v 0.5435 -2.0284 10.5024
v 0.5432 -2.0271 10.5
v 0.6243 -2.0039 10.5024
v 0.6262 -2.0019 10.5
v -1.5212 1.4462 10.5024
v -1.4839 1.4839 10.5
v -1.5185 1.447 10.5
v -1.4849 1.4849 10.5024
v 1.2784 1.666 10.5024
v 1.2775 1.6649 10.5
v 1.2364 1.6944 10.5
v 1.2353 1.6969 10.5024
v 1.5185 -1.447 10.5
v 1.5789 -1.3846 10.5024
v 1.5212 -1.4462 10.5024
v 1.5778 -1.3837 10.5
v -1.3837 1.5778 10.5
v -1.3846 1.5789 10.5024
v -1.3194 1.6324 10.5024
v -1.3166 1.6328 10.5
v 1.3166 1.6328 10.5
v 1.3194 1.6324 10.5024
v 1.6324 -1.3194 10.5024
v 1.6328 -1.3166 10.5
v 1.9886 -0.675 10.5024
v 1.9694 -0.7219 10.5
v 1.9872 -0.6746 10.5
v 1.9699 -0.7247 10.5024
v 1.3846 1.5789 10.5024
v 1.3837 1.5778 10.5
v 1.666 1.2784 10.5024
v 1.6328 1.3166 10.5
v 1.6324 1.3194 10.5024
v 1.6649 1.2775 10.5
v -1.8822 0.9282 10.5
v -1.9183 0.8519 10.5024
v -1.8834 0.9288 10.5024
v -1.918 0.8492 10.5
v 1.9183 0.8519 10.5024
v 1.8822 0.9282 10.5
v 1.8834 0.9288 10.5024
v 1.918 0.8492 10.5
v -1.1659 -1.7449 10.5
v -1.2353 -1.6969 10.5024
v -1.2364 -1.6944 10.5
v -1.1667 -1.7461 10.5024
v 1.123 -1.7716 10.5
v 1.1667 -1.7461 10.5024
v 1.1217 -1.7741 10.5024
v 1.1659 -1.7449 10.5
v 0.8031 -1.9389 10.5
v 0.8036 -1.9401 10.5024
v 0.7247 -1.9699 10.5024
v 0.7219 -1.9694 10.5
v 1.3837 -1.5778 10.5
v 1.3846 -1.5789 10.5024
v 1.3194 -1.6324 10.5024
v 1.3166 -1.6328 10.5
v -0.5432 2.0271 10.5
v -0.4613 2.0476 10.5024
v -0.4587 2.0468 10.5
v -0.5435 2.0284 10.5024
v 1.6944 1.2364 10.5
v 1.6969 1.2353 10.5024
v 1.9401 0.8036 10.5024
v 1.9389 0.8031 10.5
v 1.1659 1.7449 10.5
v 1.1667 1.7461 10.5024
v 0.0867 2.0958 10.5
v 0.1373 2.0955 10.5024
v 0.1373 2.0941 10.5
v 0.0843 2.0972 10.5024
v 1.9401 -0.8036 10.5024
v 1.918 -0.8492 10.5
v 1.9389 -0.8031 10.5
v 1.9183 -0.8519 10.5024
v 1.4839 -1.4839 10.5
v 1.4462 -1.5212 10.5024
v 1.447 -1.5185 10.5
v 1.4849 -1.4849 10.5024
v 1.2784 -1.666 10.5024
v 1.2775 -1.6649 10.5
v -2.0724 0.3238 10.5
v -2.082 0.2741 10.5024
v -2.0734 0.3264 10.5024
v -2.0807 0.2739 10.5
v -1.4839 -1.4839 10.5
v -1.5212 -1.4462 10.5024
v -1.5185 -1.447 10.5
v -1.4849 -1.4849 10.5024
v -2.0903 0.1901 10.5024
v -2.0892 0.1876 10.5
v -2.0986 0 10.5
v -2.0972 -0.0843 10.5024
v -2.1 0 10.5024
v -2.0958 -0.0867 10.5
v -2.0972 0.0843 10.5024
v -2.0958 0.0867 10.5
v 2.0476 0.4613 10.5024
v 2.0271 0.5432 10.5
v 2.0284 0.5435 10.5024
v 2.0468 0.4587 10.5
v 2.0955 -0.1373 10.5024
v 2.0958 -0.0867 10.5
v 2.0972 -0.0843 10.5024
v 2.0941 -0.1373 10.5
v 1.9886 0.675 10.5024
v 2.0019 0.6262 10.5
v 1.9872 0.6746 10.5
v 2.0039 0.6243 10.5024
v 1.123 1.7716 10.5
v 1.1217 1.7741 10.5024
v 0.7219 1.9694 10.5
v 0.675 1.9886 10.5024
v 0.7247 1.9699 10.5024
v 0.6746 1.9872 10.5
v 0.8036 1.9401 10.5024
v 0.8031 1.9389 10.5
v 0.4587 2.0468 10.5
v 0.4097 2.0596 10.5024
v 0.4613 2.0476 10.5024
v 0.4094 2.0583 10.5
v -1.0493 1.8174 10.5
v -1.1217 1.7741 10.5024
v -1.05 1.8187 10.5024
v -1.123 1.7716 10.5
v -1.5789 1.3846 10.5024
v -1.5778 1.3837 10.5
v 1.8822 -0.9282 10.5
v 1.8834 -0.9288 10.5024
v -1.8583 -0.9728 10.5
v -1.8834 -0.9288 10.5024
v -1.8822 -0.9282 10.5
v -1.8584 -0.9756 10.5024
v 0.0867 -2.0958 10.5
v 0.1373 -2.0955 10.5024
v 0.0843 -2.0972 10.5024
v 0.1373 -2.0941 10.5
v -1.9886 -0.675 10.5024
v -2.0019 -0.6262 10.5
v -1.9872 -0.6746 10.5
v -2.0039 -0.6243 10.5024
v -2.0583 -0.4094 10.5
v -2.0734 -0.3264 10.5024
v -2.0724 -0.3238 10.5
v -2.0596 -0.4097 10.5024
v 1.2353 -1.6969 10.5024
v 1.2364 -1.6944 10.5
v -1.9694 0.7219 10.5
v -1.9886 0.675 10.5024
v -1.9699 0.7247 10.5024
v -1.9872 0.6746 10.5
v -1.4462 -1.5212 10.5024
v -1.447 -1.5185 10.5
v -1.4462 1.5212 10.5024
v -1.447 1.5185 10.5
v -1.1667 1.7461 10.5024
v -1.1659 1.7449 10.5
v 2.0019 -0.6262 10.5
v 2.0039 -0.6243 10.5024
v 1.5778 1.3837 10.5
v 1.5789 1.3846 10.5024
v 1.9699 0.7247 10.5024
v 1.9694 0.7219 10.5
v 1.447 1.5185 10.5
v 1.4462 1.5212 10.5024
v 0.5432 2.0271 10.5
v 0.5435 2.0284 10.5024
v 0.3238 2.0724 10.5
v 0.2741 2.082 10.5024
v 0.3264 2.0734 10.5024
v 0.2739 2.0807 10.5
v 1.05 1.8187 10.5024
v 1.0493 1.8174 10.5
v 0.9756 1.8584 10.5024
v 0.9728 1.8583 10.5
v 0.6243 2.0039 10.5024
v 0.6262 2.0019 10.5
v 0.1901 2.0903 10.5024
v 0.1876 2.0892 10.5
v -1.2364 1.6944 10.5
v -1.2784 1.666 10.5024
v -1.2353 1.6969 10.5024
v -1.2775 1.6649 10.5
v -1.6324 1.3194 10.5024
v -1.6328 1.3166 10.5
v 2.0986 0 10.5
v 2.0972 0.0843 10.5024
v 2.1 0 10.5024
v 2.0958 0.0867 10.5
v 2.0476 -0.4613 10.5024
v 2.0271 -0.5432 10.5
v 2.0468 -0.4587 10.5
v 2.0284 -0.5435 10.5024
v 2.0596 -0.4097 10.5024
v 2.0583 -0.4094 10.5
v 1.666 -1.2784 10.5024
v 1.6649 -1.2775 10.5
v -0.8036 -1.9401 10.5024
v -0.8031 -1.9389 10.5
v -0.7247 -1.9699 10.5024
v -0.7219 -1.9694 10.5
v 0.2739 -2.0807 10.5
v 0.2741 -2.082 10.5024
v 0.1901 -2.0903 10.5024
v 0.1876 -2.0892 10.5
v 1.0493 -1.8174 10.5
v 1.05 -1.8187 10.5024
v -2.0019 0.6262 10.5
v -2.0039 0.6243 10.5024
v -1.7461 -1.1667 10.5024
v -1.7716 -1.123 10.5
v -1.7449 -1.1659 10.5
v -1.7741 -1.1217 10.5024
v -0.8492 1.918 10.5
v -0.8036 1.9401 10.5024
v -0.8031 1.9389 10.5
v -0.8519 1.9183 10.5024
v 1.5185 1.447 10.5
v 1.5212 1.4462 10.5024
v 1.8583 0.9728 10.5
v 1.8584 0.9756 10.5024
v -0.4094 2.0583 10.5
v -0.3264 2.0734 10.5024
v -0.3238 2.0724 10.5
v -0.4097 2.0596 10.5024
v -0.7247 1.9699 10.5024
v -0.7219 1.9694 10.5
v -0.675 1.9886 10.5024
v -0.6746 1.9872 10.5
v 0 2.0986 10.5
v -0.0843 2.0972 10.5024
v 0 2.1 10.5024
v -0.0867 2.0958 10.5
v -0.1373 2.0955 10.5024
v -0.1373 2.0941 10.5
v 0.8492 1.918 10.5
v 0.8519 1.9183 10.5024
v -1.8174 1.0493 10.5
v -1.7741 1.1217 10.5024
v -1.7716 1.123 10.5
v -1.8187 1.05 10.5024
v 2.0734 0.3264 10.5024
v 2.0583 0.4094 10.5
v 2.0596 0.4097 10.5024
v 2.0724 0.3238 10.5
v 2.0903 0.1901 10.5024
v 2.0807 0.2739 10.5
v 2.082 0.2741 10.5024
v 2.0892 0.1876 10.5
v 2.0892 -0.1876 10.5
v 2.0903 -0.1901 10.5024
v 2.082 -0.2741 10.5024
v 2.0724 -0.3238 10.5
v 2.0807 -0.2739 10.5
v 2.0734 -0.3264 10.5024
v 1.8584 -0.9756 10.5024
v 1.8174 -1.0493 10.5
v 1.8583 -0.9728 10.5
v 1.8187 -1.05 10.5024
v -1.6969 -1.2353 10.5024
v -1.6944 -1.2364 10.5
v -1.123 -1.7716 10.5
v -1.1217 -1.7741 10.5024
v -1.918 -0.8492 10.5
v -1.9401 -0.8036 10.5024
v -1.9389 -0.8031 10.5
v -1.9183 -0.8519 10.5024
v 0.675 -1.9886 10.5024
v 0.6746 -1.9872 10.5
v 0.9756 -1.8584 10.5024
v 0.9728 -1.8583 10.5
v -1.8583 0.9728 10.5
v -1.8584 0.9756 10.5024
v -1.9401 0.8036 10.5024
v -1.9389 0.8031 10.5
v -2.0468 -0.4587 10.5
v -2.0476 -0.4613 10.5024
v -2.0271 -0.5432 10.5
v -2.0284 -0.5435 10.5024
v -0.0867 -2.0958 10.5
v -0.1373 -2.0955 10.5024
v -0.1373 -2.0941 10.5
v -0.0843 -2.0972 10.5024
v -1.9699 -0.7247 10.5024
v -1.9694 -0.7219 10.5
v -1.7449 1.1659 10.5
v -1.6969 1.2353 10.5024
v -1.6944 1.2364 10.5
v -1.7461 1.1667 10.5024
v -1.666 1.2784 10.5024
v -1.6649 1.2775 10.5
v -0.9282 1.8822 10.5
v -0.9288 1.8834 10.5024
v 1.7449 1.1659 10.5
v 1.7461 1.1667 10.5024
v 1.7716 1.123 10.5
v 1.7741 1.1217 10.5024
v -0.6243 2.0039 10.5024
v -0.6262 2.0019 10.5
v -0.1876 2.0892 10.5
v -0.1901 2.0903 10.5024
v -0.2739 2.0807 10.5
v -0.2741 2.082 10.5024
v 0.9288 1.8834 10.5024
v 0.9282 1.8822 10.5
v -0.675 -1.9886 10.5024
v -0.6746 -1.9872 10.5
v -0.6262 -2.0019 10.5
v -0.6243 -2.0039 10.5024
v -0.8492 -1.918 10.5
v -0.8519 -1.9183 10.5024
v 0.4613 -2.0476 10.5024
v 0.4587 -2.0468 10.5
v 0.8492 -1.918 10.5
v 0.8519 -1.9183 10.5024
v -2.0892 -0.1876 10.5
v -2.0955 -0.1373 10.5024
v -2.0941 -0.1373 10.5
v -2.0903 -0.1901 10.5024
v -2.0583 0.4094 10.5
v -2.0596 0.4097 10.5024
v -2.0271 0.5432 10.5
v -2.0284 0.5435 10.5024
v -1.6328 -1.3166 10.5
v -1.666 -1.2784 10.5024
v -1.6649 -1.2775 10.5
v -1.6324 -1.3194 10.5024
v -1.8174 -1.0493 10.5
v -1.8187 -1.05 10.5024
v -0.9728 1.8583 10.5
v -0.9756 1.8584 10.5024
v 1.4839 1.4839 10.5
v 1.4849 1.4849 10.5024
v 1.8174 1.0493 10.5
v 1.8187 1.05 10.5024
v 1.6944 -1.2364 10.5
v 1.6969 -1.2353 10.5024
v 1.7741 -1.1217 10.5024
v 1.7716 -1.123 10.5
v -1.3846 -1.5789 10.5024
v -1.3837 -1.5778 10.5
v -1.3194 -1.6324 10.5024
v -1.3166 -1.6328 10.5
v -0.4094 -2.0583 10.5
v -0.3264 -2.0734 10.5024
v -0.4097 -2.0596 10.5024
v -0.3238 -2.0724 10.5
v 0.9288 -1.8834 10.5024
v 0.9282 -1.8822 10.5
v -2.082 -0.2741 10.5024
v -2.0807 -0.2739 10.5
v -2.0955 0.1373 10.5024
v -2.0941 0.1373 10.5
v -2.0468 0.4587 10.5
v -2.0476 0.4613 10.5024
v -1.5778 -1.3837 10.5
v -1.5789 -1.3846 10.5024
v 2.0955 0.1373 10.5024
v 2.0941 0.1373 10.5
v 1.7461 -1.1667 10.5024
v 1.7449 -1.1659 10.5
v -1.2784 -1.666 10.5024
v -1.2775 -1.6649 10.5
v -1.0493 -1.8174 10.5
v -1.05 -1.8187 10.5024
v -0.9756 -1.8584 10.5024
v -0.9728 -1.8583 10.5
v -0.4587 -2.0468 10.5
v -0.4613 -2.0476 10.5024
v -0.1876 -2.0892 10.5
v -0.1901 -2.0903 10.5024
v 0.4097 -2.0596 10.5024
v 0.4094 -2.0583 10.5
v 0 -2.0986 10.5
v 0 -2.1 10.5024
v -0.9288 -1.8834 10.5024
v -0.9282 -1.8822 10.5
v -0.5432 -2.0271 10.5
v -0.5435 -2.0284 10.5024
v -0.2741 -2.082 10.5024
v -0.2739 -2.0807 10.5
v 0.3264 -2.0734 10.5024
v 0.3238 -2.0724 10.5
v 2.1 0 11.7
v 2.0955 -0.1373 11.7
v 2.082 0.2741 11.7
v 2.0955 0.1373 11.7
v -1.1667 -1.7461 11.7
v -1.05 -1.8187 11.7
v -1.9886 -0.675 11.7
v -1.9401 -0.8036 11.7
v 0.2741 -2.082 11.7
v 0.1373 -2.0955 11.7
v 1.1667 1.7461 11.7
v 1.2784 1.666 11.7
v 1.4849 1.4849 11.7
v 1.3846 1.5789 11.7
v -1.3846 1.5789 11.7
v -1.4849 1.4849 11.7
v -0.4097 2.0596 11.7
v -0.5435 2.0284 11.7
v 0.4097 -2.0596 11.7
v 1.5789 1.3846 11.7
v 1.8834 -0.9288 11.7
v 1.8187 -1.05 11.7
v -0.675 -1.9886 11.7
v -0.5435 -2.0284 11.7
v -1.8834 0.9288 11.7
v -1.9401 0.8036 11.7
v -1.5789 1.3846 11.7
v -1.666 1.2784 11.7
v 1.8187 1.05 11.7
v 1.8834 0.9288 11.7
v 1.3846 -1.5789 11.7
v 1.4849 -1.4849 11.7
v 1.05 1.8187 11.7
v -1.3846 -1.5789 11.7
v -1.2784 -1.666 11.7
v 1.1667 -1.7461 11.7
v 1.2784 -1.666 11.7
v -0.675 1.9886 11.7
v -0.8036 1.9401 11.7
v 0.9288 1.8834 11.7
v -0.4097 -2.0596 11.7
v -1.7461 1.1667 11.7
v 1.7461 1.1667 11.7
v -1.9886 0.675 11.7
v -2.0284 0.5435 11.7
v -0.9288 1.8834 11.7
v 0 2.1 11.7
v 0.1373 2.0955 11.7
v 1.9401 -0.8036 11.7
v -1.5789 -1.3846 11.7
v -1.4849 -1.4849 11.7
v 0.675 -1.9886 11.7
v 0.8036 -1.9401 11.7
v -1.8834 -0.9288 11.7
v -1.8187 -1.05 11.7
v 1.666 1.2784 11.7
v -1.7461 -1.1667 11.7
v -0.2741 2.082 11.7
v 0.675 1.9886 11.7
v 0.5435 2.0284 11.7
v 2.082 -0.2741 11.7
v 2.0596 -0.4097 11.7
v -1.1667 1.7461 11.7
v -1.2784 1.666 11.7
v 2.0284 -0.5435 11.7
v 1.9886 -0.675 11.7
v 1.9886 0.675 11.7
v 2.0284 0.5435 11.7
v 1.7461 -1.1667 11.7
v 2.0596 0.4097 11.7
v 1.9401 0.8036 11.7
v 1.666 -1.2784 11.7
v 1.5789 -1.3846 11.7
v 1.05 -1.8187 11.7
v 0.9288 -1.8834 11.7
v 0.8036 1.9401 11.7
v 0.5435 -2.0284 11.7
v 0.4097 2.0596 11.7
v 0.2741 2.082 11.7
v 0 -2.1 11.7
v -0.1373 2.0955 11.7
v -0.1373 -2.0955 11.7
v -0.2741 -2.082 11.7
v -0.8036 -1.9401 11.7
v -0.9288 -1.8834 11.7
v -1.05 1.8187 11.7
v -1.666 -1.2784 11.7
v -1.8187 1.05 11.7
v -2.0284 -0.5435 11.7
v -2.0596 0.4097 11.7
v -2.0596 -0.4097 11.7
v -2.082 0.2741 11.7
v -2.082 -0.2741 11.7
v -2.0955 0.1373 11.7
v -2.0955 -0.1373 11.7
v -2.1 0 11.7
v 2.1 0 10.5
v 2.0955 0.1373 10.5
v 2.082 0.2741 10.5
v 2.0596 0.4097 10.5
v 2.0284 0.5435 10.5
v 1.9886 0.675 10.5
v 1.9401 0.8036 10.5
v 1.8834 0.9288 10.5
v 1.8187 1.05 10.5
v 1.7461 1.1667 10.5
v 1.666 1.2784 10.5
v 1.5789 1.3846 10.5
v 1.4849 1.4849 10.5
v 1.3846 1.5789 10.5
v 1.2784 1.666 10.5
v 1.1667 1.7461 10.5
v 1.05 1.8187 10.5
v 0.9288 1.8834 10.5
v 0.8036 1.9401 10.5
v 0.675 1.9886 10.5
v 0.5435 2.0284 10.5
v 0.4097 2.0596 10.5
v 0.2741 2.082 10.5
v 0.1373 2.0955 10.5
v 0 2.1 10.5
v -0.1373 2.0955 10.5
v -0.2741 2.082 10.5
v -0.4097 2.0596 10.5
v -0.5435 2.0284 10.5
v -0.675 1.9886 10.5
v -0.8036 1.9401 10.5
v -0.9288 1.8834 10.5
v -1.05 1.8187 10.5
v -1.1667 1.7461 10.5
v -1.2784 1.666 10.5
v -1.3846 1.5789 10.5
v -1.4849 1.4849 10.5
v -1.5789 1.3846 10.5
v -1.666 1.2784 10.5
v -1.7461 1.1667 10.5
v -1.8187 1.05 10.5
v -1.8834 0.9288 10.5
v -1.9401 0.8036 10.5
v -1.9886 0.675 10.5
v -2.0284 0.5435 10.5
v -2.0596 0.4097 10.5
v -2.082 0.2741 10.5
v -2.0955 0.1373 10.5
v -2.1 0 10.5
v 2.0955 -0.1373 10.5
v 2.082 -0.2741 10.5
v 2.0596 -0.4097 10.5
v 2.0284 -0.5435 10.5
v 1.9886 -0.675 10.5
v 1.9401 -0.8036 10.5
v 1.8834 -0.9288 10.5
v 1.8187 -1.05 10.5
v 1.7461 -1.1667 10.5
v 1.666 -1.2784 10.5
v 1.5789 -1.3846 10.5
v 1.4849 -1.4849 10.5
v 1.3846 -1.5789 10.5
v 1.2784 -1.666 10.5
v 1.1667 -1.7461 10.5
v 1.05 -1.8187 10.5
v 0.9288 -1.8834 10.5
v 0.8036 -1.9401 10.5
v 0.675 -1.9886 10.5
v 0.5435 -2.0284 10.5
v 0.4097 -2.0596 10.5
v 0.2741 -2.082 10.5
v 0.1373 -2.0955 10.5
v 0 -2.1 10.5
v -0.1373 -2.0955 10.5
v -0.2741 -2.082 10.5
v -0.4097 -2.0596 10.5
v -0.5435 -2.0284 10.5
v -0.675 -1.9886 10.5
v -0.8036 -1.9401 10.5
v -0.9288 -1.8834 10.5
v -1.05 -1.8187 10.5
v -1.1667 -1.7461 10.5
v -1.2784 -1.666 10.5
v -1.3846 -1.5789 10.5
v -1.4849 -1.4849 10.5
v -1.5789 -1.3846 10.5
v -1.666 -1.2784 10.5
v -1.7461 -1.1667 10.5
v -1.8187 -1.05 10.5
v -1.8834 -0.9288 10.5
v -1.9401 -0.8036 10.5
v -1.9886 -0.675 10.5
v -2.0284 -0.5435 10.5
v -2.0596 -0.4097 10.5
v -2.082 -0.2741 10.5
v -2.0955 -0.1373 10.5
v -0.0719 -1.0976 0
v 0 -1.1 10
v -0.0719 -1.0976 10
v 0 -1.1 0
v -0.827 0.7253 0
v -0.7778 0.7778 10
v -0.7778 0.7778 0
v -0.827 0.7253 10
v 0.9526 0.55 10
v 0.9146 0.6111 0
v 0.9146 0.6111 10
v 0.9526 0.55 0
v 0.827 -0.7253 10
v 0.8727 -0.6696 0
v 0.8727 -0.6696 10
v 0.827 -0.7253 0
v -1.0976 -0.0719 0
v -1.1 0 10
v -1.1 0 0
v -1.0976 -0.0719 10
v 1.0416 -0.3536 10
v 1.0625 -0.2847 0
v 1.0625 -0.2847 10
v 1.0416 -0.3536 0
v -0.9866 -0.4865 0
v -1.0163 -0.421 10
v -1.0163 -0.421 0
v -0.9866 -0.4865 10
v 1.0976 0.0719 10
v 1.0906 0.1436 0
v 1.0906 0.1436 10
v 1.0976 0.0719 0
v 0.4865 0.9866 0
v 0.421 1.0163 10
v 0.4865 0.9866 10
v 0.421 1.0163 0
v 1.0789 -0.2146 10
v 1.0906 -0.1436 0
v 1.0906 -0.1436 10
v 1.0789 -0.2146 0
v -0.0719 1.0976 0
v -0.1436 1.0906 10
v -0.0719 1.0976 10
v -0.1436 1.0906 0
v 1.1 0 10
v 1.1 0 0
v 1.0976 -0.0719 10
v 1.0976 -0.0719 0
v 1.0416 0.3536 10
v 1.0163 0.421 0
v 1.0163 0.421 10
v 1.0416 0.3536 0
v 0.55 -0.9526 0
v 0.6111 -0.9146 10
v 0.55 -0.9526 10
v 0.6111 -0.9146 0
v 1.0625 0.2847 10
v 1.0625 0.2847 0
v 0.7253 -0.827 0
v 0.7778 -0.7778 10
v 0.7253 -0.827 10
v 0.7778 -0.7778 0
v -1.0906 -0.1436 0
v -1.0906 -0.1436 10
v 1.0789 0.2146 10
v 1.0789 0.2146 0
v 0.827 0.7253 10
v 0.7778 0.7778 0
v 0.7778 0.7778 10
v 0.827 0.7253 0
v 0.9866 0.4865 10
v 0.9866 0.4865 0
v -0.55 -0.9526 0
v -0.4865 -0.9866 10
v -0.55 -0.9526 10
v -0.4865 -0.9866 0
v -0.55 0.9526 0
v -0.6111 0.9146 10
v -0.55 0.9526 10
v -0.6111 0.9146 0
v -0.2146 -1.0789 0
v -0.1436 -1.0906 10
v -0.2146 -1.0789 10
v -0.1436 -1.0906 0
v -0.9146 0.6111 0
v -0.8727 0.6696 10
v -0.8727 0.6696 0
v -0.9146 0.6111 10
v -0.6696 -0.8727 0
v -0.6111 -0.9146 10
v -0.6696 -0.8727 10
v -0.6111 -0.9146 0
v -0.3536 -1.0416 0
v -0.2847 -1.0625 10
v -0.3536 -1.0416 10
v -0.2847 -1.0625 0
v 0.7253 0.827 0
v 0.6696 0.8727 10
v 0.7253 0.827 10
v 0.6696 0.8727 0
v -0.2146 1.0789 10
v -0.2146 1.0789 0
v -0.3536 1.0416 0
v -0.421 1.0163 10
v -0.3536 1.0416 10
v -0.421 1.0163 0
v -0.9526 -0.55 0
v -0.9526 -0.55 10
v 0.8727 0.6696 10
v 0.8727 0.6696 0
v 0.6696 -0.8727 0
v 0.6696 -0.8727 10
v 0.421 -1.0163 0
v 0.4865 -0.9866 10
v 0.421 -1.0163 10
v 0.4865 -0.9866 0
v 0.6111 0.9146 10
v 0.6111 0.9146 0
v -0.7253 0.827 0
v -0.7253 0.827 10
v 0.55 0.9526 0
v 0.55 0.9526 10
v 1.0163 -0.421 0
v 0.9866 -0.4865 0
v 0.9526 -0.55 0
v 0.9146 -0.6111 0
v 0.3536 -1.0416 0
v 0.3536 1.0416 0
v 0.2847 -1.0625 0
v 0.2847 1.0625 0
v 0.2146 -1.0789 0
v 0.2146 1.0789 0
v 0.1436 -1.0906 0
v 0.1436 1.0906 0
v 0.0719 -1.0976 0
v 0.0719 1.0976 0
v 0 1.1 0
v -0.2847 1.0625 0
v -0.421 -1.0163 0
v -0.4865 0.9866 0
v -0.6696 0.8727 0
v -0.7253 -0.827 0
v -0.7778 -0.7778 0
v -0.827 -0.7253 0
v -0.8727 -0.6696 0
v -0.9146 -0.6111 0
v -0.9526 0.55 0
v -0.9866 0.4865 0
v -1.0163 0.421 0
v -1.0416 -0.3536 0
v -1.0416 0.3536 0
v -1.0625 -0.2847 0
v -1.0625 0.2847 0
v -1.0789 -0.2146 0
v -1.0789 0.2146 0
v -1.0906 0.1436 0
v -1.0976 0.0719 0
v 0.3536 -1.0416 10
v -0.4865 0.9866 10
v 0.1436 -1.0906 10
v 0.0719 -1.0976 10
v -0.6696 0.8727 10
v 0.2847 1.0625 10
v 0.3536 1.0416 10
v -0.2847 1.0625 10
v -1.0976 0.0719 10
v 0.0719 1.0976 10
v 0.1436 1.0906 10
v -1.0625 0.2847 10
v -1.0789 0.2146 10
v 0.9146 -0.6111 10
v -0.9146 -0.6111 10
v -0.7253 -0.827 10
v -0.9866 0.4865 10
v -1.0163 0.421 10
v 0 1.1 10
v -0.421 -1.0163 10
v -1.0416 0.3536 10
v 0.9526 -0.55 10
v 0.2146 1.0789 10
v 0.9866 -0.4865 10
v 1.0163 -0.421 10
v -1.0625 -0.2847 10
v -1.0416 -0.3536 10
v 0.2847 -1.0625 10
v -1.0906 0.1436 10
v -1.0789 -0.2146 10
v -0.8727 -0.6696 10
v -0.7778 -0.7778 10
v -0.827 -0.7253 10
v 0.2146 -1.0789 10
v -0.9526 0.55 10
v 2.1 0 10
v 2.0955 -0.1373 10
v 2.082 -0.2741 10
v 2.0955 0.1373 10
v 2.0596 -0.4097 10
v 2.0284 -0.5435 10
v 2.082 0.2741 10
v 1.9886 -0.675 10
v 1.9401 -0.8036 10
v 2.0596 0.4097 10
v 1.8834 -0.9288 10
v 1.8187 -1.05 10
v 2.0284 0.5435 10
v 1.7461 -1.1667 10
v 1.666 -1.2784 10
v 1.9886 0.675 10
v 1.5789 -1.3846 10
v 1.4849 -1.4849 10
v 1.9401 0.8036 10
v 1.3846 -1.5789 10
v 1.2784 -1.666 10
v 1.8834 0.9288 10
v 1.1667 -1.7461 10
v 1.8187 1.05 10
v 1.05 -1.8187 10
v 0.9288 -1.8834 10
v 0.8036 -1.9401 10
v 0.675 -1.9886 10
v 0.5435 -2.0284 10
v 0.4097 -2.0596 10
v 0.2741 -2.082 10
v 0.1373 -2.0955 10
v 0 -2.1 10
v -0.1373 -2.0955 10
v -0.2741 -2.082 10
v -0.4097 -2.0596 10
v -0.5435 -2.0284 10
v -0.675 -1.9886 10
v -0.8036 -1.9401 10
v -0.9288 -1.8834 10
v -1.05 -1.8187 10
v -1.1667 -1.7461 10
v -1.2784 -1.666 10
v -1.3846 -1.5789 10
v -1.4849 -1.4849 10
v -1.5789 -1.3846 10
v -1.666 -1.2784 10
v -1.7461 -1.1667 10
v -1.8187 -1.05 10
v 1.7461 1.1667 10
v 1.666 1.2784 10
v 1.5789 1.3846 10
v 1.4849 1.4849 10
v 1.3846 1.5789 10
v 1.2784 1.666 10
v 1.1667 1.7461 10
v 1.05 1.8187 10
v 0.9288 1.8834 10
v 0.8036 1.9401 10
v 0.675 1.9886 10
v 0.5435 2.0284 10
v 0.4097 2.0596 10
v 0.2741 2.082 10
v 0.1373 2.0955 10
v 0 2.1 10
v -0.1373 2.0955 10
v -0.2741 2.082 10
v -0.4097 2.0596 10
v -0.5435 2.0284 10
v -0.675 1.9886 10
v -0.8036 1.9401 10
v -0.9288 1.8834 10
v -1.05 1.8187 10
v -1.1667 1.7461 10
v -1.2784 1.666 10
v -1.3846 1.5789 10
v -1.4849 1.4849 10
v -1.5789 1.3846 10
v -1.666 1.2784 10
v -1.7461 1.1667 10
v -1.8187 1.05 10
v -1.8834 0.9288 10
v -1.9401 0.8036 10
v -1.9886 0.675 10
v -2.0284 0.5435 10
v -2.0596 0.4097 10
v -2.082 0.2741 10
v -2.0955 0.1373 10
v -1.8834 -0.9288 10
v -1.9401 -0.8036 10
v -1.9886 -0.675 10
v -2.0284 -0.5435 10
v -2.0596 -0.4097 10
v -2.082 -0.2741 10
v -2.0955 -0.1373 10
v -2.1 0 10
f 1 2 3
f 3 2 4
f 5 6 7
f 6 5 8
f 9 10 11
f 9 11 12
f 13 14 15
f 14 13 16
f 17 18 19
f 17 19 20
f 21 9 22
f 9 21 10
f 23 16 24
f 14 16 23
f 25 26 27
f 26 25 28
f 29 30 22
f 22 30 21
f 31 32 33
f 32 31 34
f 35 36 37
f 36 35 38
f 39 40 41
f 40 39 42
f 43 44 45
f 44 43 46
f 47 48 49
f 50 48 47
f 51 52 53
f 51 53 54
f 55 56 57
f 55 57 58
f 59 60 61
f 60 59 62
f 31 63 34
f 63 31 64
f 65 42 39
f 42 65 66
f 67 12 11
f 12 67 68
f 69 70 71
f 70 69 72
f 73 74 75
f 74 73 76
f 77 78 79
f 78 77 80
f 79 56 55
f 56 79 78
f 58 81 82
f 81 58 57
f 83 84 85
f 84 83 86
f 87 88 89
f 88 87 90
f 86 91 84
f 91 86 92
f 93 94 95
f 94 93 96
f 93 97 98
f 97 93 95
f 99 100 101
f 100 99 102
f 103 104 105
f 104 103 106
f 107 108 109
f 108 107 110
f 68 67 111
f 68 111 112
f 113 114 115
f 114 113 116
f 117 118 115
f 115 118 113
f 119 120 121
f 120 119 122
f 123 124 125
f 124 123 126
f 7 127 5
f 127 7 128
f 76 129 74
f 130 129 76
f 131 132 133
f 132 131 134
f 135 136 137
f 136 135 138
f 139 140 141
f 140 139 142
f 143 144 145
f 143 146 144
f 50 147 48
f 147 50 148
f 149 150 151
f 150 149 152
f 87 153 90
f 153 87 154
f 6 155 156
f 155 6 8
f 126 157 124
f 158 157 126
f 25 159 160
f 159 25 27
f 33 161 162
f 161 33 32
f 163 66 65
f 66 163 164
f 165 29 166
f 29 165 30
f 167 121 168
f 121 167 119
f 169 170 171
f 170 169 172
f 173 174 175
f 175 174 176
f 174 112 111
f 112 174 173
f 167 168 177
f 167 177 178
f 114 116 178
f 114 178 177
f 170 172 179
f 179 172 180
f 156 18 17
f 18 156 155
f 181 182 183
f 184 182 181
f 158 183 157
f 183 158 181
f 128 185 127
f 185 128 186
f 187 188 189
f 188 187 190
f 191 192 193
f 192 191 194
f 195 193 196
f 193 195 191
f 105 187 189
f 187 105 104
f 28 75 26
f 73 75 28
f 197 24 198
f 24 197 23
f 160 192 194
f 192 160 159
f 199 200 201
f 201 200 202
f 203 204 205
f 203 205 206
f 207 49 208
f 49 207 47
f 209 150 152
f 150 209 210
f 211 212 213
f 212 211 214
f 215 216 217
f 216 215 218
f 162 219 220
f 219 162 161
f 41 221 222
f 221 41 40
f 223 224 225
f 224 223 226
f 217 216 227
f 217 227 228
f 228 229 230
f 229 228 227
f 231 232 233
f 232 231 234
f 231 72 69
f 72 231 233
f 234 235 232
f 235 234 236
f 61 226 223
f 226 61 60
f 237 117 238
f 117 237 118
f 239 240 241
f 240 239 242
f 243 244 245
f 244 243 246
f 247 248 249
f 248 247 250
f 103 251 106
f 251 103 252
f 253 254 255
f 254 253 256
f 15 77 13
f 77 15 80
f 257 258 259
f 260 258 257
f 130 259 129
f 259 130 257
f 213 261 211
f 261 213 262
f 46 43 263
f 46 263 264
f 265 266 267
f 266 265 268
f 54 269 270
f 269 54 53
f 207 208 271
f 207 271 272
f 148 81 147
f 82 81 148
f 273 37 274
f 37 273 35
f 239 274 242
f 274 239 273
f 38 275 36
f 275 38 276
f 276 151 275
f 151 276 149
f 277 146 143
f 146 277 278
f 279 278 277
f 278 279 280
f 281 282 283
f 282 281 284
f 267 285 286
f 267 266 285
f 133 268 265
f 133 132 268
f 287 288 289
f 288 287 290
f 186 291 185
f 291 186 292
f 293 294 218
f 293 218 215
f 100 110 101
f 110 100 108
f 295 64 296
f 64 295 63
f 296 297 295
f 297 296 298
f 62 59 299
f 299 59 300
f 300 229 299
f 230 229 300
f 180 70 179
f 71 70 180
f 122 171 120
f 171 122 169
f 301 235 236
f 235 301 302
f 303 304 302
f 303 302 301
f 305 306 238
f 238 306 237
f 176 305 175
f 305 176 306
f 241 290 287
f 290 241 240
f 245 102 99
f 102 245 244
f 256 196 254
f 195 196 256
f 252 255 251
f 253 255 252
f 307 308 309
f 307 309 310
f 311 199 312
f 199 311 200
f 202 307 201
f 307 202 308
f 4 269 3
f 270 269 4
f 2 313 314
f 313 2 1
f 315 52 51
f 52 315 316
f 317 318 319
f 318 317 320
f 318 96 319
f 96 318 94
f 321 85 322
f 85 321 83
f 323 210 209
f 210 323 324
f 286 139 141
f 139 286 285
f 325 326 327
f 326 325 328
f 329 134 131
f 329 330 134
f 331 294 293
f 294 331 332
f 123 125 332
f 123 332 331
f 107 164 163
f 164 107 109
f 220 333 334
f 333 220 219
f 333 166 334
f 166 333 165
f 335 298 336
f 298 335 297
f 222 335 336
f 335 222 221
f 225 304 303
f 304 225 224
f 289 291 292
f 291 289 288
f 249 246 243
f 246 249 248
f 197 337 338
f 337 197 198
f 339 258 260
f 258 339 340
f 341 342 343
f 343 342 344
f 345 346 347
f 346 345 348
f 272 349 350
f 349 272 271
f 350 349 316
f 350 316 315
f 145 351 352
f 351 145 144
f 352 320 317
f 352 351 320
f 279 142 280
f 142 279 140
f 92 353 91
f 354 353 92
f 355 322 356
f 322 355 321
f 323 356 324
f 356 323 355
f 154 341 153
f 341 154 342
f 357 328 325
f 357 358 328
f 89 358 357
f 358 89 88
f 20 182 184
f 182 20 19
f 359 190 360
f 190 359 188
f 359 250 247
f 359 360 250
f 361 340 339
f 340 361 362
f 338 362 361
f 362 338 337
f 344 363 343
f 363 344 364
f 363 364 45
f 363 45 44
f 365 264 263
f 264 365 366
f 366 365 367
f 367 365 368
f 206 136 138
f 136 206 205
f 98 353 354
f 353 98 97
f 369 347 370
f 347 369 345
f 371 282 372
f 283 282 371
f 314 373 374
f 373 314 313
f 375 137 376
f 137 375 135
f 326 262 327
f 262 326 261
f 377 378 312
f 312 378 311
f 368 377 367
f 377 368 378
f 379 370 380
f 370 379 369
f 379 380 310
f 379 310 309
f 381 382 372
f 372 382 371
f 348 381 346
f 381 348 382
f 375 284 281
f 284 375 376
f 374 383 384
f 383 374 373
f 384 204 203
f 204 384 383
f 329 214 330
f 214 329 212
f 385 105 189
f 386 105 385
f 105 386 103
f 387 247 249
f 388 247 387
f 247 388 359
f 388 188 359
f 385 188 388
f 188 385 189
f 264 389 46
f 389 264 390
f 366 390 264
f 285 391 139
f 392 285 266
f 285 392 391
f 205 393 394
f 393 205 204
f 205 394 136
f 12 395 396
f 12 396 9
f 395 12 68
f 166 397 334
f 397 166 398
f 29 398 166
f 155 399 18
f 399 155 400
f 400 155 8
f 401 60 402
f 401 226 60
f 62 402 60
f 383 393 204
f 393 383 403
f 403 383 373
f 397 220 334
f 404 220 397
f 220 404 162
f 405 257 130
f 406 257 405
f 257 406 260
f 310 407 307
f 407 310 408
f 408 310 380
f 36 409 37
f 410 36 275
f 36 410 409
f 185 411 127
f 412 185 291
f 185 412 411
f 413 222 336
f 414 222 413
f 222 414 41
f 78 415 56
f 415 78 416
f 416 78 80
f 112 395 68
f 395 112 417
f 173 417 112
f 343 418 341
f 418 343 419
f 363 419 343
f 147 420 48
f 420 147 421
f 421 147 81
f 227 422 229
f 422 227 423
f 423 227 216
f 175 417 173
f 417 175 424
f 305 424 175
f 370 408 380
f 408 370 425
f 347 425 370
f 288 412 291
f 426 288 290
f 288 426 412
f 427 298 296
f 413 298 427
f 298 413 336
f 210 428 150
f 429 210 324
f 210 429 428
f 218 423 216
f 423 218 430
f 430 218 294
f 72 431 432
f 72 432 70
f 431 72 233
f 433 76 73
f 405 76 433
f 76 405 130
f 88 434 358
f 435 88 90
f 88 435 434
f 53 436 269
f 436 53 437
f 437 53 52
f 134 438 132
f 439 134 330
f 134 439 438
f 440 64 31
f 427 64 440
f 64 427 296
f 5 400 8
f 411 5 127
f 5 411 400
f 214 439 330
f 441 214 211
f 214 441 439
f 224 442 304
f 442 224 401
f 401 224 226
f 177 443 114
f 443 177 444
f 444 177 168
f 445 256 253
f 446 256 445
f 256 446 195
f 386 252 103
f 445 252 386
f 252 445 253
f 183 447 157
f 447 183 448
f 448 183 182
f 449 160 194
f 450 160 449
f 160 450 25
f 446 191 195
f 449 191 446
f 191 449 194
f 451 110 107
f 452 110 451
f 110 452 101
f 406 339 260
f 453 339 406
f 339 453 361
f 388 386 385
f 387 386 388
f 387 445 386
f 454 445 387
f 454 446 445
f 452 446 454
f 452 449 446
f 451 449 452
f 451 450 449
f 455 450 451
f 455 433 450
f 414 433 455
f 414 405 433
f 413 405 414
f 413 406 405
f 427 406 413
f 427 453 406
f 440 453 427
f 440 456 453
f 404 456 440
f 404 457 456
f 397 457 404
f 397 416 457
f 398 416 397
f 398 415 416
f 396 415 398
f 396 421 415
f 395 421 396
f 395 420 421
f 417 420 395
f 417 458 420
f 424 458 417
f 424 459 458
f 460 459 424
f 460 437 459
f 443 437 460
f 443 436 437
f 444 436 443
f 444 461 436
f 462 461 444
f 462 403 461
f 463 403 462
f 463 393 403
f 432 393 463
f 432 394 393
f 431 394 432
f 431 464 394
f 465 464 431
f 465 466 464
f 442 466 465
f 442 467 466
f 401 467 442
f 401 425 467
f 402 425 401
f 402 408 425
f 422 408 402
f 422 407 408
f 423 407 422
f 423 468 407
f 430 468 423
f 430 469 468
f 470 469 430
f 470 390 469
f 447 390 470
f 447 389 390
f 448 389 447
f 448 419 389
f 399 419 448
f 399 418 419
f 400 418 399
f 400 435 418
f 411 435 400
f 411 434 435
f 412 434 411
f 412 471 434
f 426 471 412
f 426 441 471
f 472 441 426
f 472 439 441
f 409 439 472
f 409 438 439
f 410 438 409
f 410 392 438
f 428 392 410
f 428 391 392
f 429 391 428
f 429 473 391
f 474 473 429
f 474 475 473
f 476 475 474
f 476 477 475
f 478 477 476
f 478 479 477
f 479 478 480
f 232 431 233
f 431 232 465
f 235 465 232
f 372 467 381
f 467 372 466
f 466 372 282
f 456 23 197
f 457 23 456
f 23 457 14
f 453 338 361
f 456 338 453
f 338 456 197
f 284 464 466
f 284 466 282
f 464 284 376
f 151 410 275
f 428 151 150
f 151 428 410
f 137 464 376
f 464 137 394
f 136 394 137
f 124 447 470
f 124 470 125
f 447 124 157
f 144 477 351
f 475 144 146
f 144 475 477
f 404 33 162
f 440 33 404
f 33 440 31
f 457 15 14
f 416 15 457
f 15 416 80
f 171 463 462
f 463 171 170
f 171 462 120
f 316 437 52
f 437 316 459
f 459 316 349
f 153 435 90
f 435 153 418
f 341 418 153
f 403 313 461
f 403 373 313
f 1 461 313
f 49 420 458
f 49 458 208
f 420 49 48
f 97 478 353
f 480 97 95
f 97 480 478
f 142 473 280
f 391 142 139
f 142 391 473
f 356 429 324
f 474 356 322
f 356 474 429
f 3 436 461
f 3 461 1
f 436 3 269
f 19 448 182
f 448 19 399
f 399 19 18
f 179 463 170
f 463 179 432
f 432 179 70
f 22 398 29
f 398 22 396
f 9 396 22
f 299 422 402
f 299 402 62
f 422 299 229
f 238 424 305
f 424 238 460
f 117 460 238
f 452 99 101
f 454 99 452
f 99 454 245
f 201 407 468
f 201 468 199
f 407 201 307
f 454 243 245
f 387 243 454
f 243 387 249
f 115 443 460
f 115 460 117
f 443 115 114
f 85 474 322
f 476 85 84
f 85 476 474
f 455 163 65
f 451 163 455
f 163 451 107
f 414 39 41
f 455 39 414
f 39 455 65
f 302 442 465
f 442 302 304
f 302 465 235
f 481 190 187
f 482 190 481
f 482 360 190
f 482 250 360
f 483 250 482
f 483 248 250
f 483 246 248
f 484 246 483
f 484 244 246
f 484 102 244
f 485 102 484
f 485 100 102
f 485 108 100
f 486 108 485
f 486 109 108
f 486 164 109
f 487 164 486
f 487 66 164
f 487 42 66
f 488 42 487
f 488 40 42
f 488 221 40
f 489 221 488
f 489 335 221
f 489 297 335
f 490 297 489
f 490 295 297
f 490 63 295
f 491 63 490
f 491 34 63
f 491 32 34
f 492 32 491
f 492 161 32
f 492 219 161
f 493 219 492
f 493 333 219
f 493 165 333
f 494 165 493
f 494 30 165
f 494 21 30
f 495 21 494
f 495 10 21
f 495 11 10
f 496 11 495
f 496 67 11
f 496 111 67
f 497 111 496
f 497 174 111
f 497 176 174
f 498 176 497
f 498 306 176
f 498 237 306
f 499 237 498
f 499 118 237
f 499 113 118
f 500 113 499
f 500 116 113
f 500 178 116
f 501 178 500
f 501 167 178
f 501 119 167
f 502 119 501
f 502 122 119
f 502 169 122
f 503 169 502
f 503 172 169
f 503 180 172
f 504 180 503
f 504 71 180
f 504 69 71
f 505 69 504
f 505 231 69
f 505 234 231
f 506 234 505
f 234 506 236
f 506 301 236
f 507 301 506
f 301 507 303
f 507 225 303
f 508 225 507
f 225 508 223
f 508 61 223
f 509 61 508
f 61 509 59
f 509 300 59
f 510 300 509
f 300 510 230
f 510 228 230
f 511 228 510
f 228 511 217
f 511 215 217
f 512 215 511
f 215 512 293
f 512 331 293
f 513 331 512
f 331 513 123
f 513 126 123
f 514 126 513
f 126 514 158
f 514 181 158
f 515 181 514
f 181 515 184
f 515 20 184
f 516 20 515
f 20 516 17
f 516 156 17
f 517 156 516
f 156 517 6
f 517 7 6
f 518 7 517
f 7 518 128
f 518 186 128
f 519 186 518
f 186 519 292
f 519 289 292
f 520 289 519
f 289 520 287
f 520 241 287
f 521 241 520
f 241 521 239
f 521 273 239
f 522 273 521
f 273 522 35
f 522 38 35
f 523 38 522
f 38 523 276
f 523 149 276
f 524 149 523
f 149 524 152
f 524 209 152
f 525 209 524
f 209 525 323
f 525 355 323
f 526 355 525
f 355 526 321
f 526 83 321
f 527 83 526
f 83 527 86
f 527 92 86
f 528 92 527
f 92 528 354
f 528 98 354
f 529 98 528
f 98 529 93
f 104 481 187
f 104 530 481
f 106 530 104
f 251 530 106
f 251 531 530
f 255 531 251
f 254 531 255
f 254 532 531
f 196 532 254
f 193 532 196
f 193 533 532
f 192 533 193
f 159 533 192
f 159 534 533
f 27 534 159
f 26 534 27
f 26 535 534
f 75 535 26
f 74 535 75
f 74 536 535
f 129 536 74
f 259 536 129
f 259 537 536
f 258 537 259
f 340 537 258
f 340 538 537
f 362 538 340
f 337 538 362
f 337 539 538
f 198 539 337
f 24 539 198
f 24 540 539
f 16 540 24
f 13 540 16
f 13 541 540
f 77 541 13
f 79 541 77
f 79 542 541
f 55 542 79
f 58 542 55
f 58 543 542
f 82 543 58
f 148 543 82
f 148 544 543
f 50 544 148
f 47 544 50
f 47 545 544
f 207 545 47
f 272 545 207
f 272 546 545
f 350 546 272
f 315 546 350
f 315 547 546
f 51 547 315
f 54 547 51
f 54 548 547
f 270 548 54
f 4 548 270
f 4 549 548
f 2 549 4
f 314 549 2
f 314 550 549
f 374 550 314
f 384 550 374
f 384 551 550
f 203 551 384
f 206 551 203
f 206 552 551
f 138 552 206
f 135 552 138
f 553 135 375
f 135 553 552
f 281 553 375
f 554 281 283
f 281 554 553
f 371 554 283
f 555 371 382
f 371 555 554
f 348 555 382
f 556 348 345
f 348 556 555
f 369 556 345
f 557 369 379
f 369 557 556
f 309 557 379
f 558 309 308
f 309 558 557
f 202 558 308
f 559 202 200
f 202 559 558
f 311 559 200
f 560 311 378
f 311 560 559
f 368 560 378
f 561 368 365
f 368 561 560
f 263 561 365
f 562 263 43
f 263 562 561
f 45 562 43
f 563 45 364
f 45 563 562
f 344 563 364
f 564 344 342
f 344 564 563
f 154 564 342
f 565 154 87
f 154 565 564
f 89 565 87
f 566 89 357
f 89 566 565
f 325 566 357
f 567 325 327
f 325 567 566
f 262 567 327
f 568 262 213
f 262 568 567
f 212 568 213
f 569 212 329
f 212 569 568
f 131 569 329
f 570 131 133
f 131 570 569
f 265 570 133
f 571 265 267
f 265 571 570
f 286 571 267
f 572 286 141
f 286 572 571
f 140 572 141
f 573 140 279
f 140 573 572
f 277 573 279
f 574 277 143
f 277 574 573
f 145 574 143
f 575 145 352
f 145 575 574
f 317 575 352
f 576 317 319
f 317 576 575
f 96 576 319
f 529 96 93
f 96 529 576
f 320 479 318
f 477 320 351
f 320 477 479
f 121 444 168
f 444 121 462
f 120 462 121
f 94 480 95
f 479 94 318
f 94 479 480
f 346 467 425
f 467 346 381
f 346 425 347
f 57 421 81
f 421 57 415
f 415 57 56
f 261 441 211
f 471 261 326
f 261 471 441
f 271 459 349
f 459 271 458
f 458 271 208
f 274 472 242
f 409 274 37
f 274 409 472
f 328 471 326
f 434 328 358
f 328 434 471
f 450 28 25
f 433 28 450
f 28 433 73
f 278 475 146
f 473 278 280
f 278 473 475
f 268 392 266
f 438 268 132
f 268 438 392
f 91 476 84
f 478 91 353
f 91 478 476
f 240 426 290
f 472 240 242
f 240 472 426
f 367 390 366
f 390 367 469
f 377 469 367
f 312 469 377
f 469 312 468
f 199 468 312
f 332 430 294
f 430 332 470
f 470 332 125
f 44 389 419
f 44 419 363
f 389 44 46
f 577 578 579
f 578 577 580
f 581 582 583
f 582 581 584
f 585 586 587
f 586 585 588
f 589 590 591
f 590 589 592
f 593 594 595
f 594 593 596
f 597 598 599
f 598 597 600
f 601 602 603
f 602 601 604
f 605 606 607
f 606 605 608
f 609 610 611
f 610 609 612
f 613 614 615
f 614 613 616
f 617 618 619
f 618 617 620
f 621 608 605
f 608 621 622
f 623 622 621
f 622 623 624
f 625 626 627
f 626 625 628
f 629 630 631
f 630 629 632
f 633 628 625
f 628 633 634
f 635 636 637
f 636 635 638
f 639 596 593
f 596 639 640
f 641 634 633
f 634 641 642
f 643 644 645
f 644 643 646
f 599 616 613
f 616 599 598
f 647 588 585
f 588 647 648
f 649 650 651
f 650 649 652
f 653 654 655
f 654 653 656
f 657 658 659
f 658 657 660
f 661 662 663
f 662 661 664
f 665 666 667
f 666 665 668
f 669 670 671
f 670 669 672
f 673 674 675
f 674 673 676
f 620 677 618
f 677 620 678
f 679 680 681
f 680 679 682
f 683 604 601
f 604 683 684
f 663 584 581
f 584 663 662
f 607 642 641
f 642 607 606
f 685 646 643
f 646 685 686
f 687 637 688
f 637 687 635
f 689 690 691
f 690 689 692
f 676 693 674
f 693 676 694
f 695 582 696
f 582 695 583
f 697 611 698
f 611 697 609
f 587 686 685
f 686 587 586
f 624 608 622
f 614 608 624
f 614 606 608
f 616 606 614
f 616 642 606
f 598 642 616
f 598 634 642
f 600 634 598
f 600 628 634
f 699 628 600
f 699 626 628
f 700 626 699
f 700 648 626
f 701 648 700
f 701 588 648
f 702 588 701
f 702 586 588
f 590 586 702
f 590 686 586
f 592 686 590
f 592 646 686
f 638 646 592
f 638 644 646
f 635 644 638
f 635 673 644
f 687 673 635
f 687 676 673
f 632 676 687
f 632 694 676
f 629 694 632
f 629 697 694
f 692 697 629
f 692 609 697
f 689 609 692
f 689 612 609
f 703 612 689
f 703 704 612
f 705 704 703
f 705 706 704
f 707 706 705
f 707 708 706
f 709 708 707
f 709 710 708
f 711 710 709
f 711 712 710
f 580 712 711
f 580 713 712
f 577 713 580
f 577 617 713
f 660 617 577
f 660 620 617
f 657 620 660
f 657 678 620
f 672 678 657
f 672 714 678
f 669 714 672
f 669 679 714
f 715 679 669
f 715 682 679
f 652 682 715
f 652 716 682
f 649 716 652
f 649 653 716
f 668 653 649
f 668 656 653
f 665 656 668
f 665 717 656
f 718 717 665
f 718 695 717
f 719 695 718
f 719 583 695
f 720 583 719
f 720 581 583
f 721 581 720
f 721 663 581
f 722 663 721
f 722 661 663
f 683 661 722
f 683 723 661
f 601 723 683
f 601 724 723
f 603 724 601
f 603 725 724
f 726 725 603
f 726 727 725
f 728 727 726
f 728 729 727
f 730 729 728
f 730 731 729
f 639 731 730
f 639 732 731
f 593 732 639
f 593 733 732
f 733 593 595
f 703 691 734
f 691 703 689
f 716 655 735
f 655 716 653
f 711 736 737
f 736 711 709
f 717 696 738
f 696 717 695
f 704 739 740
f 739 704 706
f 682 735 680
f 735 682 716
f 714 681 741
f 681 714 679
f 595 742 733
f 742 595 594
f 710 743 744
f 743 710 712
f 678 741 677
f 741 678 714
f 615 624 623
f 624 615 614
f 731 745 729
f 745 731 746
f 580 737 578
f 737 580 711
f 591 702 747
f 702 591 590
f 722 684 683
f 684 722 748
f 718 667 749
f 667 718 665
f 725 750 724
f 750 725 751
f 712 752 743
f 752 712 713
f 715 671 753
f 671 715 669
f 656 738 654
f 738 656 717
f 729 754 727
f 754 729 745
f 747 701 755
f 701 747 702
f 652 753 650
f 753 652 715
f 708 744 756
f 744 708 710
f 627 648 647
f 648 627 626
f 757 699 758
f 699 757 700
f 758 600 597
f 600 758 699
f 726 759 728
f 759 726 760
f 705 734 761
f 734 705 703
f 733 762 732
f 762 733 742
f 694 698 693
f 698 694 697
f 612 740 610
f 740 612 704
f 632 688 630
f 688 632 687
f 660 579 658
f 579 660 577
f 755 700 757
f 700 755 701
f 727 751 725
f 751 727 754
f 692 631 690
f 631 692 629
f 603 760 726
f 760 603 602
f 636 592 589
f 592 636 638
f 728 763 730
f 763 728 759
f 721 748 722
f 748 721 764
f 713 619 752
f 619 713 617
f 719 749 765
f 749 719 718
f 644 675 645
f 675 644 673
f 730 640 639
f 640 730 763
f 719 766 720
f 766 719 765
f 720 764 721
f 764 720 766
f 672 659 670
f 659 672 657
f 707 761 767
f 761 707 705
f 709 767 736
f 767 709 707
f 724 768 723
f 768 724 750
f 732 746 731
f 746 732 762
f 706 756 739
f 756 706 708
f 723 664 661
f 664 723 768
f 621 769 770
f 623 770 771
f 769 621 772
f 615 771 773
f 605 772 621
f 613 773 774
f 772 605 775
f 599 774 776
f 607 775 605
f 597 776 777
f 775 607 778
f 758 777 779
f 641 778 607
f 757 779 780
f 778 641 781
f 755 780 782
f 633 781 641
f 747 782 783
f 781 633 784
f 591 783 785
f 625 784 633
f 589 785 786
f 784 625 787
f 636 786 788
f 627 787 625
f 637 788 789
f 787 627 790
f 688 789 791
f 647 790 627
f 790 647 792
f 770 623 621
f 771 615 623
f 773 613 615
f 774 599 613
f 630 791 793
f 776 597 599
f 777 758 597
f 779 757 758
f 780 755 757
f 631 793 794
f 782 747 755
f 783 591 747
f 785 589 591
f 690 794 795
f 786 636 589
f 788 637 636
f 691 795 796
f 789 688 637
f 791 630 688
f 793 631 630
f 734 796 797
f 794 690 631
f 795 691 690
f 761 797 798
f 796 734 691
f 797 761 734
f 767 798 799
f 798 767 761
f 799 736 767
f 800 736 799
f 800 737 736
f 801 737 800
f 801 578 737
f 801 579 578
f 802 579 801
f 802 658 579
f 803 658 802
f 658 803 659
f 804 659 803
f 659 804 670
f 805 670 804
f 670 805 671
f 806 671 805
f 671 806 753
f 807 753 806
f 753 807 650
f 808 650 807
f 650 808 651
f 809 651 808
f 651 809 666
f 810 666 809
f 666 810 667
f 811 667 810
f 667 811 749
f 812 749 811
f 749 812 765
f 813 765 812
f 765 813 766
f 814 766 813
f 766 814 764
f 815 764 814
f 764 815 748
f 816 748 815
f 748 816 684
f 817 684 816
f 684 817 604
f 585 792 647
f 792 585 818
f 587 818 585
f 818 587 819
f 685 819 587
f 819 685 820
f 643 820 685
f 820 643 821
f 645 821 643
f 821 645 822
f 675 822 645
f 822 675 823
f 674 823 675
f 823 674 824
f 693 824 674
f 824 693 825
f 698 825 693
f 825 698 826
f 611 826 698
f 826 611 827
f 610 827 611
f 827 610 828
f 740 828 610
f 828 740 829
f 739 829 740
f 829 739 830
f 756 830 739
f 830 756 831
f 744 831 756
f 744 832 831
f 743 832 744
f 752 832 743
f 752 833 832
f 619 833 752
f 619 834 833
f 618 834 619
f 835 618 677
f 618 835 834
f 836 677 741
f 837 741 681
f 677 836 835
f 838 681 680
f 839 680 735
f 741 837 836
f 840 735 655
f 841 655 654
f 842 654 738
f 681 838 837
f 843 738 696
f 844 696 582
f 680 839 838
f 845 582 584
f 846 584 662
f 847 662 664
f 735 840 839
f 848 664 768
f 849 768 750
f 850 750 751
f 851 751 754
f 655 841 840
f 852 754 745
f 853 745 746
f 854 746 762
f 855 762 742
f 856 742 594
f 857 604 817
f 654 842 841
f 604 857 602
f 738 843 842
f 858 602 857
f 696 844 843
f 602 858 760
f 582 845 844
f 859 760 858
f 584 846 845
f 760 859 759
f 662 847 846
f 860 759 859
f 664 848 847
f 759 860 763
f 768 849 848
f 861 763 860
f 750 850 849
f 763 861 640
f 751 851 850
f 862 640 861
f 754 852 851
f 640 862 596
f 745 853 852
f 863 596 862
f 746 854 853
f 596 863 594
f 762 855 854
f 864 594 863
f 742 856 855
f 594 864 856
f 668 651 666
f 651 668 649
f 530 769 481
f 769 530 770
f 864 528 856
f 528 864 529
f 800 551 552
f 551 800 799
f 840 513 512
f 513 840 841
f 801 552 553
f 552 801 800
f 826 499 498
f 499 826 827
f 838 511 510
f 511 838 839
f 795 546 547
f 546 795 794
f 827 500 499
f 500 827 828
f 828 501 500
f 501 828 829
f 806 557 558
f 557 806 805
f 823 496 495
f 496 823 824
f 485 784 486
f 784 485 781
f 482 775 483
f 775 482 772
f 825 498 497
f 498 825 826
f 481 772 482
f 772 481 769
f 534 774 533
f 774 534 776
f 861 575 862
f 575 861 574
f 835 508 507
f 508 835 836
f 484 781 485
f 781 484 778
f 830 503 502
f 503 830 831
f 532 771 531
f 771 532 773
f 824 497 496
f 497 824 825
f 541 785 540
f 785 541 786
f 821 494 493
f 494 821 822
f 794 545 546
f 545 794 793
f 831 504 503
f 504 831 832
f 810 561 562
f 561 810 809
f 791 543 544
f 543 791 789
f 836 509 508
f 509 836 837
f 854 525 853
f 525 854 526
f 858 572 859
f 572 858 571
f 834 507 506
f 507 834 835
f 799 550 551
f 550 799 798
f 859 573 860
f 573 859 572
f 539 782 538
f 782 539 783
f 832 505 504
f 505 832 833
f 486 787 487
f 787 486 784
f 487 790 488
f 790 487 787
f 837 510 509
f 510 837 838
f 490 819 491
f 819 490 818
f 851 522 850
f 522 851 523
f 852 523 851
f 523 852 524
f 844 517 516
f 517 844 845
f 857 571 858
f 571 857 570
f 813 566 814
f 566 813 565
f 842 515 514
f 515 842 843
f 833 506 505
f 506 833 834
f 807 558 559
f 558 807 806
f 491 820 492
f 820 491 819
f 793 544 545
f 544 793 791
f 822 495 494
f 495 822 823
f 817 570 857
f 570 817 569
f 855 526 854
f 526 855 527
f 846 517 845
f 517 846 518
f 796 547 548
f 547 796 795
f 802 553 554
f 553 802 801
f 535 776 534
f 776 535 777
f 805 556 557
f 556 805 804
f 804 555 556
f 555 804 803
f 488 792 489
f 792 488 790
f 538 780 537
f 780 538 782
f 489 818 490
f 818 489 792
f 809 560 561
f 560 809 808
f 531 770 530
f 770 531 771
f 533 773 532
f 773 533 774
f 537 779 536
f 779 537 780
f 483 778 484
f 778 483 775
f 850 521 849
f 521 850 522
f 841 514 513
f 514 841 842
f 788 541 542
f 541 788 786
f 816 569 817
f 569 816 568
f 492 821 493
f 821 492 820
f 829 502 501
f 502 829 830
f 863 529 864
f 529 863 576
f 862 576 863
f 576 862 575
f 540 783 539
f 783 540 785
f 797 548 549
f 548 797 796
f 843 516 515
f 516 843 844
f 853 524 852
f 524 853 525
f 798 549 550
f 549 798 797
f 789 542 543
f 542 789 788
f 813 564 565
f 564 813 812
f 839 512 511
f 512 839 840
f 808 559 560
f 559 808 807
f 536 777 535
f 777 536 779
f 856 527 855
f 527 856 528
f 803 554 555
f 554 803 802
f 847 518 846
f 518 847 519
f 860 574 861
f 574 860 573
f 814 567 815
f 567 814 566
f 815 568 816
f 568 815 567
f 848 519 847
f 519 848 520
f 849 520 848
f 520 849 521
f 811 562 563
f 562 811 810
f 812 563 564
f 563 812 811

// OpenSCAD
$fn = 96;

d_shaft = 2.2;
L = 10;

d_head = 4.2;
h_head = 1.7;

// Simple pan head approximation: short cylinder + spherical cap
module pan_head_screw(d_shaft, L, d_head, h_head) {
    union() {
        // Shaft
        cylinder(d = d_shaft, h = L);

        // Head base cylinder (small rim)
        head_rim_h = min(0.5, h_head * 0.35);
        translate([0,0,L])
            cylinder(d = d_head, h = head_rim_h);

        // Spherical cap for rounded top
        cap_h = h_head - head_rim_h;
        if (cap_h > 0) {
            // Sphere radius chosen so cap height = cap_h with base radius = d_head/2
            a = d_head/2;
            R = (a*a + cap_h*cap_h) / (2*cap_h);

            translate([0,0,L + head_rim_h])
                intersection() {
                    // Sphere centered so that z=0 plane cuts at the cap base
                    translate([0,0,R - cap_h]) sphere(r = R);
                    cylinder(d = d_head, h = cap_h);
                }
        }
    }
}

pan_head_screw(d_shaft, L, d_head, h_head);
